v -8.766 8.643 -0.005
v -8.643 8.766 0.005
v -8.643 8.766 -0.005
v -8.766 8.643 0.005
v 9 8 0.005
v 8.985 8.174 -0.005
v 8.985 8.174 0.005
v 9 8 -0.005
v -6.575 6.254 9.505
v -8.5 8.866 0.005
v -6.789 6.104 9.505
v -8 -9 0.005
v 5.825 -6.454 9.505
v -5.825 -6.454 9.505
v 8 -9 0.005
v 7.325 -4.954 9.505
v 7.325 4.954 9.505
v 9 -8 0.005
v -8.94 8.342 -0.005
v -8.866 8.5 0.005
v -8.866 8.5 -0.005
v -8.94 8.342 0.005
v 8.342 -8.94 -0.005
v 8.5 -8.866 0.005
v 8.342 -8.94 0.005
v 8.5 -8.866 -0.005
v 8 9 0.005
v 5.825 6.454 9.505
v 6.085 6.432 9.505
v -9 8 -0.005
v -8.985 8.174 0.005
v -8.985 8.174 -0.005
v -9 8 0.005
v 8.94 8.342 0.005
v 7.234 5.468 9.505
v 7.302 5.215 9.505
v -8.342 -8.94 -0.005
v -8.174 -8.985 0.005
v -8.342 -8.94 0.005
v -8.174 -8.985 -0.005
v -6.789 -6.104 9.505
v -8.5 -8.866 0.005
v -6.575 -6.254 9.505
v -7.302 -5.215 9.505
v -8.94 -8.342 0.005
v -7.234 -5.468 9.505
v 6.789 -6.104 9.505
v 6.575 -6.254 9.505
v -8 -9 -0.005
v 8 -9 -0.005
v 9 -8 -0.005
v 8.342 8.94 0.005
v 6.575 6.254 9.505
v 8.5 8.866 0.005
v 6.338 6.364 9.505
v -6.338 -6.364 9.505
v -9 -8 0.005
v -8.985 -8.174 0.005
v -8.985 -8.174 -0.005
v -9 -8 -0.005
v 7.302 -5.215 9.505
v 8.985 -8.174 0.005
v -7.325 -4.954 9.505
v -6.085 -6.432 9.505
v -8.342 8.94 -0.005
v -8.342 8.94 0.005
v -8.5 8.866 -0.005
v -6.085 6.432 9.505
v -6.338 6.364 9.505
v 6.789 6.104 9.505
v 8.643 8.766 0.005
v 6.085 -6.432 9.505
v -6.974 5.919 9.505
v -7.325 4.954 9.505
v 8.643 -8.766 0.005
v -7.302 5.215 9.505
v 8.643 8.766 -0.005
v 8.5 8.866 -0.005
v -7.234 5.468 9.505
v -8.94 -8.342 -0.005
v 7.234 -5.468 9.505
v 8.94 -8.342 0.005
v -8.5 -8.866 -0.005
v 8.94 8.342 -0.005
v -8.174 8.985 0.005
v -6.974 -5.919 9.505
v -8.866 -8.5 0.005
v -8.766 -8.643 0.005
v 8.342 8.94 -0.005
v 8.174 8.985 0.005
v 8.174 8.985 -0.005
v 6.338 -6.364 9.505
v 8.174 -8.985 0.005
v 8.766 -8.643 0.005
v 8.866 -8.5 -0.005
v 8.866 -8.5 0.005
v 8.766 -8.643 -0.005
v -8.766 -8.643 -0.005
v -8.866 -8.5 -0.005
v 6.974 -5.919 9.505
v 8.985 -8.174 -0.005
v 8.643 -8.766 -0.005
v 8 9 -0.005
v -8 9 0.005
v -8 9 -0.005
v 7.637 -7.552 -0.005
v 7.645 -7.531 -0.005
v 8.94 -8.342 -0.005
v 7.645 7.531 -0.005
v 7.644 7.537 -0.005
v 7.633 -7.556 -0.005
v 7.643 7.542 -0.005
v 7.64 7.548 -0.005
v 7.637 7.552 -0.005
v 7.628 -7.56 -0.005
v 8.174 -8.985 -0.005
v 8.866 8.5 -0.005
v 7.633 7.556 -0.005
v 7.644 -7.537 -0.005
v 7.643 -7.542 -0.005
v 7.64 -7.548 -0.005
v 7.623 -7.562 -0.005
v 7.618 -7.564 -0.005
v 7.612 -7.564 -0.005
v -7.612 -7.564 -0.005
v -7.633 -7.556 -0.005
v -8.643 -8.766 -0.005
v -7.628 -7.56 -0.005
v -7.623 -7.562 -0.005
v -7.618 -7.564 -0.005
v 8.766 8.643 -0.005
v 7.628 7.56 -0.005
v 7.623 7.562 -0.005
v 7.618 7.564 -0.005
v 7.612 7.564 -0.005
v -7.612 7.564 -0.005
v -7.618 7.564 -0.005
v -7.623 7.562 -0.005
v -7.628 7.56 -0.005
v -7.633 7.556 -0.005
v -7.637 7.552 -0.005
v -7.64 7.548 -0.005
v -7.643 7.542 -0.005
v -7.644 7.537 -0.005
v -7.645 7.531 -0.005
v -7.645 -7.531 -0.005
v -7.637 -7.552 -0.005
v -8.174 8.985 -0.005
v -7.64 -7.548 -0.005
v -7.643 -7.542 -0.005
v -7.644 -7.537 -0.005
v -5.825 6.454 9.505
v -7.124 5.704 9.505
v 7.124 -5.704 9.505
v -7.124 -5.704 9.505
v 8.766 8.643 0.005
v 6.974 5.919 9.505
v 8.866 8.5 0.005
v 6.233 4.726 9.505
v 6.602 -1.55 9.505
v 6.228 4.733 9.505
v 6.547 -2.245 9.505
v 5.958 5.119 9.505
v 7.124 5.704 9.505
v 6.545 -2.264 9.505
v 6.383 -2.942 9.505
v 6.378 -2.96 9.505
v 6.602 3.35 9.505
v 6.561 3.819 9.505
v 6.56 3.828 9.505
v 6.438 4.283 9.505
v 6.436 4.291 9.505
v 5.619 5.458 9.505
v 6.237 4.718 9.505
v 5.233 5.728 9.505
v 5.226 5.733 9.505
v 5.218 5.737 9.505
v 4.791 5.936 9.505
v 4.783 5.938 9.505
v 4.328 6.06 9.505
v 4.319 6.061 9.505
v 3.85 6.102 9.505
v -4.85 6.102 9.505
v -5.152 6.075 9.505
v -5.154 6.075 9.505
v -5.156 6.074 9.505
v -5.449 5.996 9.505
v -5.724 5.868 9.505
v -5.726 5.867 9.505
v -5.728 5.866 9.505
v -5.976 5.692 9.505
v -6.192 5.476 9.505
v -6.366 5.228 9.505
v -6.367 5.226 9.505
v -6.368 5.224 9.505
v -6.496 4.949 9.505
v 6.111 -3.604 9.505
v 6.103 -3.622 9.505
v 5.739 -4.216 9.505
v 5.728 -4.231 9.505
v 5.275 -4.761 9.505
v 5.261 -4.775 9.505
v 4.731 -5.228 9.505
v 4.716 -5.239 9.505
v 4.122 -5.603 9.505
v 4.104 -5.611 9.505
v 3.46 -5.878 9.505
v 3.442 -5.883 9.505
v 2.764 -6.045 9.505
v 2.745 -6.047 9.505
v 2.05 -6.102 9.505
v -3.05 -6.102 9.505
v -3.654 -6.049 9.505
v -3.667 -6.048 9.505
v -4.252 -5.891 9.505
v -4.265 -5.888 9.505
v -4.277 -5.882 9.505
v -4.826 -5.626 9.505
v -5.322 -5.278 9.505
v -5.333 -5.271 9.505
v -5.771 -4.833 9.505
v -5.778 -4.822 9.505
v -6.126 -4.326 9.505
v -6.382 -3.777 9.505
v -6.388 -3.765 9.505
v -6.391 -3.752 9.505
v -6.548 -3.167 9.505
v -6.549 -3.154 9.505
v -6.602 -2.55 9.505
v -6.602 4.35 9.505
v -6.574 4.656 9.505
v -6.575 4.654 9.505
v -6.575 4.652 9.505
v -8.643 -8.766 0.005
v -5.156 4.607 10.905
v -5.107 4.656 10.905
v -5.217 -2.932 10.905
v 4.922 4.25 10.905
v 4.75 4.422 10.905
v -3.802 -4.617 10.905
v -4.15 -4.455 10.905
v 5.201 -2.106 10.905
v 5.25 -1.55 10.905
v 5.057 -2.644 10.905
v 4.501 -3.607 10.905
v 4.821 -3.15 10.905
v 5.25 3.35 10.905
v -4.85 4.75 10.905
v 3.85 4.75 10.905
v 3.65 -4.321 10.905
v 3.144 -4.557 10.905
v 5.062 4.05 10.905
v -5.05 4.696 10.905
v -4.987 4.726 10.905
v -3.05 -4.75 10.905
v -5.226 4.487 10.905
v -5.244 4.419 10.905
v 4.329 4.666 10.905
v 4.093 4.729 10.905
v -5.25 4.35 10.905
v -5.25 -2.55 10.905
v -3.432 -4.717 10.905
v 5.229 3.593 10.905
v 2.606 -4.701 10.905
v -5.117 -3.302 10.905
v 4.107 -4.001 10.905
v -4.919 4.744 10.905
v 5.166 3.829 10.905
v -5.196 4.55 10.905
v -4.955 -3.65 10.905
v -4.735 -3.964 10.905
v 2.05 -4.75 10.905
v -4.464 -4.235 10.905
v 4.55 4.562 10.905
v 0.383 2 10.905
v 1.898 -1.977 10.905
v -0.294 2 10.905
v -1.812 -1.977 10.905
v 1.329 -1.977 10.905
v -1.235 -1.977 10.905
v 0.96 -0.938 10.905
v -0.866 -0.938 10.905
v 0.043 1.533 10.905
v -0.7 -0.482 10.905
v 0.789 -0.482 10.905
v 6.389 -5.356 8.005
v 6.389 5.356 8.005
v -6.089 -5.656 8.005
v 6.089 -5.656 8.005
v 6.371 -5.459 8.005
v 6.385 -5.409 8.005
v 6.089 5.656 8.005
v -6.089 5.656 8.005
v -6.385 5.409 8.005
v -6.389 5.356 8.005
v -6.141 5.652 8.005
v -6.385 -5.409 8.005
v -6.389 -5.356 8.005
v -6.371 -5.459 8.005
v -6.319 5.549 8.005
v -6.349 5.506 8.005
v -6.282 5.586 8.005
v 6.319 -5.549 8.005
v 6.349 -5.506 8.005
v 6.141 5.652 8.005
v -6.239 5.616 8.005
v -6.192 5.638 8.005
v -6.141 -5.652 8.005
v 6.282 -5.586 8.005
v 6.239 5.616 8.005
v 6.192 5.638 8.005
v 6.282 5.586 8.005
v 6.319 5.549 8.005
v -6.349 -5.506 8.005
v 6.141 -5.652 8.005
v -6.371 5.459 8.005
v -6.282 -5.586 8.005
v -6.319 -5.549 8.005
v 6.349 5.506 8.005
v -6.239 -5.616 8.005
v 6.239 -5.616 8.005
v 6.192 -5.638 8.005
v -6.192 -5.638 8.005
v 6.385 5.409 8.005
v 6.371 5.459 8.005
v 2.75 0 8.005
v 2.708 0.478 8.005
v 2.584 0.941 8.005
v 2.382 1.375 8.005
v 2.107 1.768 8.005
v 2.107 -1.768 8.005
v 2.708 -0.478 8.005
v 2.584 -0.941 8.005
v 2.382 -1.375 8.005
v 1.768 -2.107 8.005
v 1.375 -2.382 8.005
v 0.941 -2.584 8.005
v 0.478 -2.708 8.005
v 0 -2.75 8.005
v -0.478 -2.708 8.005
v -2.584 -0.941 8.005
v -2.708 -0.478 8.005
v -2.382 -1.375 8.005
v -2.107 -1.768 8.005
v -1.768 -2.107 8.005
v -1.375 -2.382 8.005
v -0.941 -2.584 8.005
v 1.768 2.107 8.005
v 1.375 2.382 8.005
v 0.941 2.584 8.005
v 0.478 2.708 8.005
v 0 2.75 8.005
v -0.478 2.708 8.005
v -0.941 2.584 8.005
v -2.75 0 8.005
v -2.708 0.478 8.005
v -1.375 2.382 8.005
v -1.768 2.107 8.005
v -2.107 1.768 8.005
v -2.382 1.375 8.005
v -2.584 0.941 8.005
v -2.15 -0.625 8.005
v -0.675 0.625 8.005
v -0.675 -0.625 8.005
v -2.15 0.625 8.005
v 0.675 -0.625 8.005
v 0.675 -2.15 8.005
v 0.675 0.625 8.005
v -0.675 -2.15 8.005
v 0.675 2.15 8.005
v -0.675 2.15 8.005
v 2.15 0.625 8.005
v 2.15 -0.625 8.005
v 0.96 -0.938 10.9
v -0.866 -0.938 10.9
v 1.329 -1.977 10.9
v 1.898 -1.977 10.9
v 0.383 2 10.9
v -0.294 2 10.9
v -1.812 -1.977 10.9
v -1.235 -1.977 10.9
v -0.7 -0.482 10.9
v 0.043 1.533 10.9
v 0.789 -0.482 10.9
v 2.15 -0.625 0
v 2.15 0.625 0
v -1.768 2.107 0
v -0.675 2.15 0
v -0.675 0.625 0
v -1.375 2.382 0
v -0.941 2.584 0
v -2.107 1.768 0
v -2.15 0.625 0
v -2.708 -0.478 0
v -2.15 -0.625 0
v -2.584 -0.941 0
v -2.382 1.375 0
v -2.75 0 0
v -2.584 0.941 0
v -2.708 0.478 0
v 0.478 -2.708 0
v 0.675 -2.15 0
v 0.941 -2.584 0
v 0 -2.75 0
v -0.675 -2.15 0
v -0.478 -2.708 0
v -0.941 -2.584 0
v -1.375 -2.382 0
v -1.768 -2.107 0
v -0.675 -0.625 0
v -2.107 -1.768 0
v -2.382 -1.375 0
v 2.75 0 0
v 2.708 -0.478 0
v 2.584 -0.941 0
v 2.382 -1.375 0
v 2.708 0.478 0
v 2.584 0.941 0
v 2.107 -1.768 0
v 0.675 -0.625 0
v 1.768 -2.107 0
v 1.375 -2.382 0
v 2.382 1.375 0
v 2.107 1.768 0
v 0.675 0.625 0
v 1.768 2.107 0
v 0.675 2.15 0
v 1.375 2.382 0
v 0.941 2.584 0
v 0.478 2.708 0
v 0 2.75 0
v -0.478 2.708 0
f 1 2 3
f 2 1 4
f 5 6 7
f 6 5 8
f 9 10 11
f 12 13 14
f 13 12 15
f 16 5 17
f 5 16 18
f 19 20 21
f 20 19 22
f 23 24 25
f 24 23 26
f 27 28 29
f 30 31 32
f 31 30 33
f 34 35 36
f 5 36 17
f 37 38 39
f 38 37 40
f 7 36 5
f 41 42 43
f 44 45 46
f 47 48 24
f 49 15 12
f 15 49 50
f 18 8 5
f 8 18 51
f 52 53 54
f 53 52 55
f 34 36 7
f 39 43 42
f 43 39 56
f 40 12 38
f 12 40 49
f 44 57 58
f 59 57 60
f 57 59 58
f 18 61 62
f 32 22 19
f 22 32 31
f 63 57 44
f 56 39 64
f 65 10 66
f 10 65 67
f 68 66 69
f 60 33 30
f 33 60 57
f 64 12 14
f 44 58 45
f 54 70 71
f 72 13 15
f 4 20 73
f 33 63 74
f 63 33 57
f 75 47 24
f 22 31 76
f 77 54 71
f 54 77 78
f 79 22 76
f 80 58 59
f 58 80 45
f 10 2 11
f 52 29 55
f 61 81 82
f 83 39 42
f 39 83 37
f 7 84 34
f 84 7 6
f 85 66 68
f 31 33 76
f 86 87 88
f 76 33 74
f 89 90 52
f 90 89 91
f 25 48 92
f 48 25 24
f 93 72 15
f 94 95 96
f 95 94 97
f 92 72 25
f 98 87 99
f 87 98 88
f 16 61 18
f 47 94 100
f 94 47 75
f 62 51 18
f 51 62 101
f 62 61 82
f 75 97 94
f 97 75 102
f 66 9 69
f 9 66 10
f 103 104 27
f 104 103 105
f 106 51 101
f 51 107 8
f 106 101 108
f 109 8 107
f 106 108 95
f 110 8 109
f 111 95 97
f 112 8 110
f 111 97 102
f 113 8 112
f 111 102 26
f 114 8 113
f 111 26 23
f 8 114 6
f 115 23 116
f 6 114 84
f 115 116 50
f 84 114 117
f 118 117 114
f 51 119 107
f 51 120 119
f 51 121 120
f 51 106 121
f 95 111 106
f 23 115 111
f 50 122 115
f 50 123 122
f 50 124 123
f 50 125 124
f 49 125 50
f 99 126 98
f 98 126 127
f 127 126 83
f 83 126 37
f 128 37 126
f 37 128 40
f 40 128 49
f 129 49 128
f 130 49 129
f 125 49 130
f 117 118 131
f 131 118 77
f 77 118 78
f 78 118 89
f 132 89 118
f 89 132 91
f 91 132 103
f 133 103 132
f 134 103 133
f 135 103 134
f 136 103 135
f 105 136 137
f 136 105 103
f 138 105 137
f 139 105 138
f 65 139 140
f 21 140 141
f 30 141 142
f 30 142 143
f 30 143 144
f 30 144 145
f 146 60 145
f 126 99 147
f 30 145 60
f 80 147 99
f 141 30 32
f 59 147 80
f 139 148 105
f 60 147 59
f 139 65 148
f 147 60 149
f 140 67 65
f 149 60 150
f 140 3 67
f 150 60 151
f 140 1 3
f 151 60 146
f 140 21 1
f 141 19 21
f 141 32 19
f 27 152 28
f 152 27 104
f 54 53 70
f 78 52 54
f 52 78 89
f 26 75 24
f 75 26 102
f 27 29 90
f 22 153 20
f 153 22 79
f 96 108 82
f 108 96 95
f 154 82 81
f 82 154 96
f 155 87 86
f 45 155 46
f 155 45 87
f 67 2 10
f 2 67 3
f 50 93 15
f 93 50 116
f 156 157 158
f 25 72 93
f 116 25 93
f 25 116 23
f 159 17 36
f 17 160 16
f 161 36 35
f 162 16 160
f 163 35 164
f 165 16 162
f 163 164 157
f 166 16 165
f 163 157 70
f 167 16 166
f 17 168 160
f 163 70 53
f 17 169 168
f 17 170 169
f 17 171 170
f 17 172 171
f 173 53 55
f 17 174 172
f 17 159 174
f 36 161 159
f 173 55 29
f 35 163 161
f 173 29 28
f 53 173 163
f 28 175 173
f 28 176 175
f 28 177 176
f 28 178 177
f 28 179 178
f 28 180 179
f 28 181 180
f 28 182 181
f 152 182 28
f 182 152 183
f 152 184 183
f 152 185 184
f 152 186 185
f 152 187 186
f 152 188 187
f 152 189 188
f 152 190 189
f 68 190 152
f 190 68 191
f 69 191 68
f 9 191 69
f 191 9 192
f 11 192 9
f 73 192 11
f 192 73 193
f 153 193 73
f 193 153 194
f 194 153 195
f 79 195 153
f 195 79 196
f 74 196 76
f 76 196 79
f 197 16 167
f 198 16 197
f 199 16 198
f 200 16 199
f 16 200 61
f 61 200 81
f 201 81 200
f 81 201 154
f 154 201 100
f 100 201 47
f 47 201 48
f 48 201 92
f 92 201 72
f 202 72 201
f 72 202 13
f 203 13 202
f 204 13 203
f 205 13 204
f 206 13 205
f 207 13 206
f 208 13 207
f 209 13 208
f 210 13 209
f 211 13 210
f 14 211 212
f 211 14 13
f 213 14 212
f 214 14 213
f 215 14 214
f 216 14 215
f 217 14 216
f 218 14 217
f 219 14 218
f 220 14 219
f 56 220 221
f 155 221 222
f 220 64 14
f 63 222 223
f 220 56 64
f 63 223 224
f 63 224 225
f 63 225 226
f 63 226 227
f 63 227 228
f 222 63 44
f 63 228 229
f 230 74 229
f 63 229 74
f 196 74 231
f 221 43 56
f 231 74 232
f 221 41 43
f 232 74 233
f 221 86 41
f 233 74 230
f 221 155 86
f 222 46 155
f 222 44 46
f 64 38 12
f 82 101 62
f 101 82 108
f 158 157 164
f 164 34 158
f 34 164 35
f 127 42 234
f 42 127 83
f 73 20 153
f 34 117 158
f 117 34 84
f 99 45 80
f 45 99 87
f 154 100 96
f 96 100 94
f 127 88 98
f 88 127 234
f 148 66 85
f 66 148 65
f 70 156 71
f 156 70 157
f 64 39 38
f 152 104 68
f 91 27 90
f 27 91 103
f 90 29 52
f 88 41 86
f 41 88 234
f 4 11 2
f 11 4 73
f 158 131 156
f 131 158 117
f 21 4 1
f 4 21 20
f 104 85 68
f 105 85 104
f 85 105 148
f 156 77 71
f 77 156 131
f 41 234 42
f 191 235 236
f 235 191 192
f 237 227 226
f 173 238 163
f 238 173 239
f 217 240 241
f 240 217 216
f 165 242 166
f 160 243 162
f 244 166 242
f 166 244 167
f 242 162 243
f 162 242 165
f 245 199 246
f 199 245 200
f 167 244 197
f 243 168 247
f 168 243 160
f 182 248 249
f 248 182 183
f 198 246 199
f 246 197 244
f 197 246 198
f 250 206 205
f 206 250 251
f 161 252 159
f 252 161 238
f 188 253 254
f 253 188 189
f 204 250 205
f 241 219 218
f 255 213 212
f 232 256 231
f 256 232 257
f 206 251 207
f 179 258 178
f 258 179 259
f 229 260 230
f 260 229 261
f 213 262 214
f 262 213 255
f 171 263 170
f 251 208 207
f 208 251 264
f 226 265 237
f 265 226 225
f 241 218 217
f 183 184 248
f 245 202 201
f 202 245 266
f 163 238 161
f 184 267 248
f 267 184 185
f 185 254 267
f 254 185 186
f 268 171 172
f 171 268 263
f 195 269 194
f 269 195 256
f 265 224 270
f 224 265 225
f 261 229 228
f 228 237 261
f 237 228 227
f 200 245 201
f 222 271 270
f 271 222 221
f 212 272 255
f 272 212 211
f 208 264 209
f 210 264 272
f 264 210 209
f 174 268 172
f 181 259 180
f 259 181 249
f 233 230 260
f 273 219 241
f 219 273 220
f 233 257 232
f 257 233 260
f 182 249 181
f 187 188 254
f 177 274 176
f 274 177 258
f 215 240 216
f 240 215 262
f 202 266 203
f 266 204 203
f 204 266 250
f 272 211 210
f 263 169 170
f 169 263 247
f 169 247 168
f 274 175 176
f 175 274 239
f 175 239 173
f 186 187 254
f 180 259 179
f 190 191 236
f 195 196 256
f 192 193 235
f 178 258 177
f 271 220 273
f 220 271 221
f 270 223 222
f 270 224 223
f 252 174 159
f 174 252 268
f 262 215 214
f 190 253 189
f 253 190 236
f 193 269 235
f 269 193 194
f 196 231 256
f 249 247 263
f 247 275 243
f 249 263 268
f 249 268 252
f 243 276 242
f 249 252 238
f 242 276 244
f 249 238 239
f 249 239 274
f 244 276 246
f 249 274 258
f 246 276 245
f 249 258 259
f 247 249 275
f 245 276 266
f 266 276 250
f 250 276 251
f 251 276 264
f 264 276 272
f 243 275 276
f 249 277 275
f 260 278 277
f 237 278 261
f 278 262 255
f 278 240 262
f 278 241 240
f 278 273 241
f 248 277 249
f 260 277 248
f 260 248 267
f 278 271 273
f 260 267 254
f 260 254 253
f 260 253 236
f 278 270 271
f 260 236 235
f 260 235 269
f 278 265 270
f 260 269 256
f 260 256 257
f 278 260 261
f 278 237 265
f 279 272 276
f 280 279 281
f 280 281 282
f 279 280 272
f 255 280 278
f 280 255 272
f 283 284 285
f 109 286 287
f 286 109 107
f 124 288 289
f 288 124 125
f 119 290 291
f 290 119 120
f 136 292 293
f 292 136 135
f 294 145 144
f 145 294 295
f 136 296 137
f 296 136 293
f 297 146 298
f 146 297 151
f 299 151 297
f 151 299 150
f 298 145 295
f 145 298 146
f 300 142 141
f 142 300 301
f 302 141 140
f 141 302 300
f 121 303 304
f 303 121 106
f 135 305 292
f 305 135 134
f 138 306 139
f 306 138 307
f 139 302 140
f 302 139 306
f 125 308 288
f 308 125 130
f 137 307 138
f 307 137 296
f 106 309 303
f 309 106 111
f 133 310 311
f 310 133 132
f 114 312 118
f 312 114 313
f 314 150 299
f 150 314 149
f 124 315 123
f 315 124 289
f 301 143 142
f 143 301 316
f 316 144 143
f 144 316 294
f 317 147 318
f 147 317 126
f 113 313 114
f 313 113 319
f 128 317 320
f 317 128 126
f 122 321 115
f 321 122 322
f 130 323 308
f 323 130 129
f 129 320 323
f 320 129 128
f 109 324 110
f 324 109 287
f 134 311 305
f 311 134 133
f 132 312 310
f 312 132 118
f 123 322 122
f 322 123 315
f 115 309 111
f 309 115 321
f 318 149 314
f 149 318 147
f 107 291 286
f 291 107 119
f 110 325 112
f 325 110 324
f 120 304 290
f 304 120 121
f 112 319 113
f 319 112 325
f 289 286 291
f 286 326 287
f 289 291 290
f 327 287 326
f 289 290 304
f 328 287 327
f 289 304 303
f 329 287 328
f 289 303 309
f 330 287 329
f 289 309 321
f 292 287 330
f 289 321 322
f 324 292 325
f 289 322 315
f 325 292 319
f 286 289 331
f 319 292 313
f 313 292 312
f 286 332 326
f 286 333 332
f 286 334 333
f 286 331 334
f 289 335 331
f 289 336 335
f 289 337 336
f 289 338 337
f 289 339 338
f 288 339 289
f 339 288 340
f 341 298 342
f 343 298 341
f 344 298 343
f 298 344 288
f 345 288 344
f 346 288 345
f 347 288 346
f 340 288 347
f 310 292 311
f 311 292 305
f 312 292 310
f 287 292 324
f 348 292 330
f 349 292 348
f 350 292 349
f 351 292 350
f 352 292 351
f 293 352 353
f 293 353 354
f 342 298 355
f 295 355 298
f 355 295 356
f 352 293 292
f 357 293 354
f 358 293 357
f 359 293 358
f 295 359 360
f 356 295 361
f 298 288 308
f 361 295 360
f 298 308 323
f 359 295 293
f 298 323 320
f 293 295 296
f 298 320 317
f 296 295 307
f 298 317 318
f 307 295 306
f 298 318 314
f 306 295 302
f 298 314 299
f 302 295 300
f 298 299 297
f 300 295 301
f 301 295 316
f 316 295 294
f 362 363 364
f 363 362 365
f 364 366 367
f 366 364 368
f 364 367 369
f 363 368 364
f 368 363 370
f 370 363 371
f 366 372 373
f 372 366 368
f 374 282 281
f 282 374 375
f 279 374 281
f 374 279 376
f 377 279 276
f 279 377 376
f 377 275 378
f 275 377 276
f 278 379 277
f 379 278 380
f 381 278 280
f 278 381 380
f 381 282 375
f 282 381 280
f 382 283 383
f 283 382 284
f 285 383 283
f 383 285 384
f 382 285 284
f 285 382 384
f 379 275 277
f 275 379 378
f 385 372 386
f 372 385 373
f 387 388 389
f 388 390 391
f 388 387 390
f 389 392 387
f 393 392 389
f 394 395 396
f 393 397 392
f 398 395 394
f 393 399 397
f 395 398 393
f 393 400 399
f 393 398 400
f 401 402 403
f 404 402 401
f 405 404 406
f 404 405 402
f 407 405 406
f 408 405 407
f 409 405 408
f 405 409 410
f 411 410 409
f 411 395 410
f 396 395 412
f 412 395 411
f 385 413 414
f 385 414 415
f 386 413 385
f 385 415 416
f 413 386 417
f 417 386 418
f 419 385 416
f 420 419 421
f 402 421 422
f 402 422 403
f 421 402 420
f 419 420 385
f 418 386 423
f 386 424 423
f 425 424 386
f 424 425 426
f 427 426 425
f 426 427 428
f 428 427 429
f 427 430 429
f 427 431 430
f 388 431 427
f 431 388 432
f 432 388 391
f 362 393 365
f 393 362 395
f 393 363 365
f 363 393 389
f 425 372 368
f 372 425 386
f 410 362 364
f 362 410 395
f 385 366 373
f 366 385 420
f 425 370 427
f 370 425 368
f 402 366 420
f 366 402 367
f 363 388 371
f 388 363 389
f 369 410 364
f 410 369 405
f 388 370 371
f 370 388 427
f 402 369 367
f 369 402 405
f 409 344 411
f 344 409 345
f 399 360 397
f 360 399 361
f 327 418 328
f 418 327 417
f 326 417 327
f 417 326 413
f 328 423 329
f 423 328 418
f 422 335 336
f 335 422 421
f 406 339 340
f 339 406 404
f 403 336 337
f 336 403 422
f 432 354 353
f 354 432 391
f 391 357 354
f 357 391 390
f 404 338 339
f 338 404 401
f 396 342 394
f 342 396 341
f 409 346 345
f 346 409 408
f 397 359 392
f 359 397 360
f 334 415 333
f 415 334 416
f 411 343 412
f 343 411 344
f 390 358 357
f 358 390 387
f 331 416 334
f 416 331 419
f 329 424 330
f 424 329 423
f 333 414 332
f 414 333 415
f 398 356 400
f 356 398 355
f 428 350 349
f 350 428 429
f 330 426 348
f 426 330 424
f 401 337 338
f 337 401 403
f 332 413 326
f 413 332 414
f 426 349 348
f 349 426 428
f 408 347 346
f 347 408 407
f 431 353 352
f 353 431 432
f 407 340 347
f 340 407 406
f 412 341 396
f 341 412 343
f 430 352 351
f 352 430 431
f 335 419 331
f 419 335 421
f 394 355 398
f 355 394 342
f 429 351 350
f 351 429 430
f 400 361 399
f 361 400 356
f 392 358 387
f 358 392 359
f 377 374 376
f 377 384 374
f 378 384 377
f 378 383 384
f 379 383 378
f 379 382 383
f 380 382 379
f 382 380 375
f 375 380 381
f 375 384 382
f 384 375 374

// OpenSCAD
export_target = "preview";
include <common/custom-shell-params.scad>

user_top_hat_enabled = true;
user_top_hat_top_width = 10.5;
user_top_hat_top_depth = 9.5;
user_top_hat_top_radius = 1.8;
user_top_hat_top_radius_individual_enabled = true;
// [left_top, right_top, right_bottom, left_bottom]
user_top_hat_top_radii = [0.4, 1.4, 3.2, 2.2];
user_top_hat_height = 1.4;
user_top_hat_shoulder_angle = 45;
user_top_hat_shoulder_radius = 0;

include <../base/keycap.scad>
